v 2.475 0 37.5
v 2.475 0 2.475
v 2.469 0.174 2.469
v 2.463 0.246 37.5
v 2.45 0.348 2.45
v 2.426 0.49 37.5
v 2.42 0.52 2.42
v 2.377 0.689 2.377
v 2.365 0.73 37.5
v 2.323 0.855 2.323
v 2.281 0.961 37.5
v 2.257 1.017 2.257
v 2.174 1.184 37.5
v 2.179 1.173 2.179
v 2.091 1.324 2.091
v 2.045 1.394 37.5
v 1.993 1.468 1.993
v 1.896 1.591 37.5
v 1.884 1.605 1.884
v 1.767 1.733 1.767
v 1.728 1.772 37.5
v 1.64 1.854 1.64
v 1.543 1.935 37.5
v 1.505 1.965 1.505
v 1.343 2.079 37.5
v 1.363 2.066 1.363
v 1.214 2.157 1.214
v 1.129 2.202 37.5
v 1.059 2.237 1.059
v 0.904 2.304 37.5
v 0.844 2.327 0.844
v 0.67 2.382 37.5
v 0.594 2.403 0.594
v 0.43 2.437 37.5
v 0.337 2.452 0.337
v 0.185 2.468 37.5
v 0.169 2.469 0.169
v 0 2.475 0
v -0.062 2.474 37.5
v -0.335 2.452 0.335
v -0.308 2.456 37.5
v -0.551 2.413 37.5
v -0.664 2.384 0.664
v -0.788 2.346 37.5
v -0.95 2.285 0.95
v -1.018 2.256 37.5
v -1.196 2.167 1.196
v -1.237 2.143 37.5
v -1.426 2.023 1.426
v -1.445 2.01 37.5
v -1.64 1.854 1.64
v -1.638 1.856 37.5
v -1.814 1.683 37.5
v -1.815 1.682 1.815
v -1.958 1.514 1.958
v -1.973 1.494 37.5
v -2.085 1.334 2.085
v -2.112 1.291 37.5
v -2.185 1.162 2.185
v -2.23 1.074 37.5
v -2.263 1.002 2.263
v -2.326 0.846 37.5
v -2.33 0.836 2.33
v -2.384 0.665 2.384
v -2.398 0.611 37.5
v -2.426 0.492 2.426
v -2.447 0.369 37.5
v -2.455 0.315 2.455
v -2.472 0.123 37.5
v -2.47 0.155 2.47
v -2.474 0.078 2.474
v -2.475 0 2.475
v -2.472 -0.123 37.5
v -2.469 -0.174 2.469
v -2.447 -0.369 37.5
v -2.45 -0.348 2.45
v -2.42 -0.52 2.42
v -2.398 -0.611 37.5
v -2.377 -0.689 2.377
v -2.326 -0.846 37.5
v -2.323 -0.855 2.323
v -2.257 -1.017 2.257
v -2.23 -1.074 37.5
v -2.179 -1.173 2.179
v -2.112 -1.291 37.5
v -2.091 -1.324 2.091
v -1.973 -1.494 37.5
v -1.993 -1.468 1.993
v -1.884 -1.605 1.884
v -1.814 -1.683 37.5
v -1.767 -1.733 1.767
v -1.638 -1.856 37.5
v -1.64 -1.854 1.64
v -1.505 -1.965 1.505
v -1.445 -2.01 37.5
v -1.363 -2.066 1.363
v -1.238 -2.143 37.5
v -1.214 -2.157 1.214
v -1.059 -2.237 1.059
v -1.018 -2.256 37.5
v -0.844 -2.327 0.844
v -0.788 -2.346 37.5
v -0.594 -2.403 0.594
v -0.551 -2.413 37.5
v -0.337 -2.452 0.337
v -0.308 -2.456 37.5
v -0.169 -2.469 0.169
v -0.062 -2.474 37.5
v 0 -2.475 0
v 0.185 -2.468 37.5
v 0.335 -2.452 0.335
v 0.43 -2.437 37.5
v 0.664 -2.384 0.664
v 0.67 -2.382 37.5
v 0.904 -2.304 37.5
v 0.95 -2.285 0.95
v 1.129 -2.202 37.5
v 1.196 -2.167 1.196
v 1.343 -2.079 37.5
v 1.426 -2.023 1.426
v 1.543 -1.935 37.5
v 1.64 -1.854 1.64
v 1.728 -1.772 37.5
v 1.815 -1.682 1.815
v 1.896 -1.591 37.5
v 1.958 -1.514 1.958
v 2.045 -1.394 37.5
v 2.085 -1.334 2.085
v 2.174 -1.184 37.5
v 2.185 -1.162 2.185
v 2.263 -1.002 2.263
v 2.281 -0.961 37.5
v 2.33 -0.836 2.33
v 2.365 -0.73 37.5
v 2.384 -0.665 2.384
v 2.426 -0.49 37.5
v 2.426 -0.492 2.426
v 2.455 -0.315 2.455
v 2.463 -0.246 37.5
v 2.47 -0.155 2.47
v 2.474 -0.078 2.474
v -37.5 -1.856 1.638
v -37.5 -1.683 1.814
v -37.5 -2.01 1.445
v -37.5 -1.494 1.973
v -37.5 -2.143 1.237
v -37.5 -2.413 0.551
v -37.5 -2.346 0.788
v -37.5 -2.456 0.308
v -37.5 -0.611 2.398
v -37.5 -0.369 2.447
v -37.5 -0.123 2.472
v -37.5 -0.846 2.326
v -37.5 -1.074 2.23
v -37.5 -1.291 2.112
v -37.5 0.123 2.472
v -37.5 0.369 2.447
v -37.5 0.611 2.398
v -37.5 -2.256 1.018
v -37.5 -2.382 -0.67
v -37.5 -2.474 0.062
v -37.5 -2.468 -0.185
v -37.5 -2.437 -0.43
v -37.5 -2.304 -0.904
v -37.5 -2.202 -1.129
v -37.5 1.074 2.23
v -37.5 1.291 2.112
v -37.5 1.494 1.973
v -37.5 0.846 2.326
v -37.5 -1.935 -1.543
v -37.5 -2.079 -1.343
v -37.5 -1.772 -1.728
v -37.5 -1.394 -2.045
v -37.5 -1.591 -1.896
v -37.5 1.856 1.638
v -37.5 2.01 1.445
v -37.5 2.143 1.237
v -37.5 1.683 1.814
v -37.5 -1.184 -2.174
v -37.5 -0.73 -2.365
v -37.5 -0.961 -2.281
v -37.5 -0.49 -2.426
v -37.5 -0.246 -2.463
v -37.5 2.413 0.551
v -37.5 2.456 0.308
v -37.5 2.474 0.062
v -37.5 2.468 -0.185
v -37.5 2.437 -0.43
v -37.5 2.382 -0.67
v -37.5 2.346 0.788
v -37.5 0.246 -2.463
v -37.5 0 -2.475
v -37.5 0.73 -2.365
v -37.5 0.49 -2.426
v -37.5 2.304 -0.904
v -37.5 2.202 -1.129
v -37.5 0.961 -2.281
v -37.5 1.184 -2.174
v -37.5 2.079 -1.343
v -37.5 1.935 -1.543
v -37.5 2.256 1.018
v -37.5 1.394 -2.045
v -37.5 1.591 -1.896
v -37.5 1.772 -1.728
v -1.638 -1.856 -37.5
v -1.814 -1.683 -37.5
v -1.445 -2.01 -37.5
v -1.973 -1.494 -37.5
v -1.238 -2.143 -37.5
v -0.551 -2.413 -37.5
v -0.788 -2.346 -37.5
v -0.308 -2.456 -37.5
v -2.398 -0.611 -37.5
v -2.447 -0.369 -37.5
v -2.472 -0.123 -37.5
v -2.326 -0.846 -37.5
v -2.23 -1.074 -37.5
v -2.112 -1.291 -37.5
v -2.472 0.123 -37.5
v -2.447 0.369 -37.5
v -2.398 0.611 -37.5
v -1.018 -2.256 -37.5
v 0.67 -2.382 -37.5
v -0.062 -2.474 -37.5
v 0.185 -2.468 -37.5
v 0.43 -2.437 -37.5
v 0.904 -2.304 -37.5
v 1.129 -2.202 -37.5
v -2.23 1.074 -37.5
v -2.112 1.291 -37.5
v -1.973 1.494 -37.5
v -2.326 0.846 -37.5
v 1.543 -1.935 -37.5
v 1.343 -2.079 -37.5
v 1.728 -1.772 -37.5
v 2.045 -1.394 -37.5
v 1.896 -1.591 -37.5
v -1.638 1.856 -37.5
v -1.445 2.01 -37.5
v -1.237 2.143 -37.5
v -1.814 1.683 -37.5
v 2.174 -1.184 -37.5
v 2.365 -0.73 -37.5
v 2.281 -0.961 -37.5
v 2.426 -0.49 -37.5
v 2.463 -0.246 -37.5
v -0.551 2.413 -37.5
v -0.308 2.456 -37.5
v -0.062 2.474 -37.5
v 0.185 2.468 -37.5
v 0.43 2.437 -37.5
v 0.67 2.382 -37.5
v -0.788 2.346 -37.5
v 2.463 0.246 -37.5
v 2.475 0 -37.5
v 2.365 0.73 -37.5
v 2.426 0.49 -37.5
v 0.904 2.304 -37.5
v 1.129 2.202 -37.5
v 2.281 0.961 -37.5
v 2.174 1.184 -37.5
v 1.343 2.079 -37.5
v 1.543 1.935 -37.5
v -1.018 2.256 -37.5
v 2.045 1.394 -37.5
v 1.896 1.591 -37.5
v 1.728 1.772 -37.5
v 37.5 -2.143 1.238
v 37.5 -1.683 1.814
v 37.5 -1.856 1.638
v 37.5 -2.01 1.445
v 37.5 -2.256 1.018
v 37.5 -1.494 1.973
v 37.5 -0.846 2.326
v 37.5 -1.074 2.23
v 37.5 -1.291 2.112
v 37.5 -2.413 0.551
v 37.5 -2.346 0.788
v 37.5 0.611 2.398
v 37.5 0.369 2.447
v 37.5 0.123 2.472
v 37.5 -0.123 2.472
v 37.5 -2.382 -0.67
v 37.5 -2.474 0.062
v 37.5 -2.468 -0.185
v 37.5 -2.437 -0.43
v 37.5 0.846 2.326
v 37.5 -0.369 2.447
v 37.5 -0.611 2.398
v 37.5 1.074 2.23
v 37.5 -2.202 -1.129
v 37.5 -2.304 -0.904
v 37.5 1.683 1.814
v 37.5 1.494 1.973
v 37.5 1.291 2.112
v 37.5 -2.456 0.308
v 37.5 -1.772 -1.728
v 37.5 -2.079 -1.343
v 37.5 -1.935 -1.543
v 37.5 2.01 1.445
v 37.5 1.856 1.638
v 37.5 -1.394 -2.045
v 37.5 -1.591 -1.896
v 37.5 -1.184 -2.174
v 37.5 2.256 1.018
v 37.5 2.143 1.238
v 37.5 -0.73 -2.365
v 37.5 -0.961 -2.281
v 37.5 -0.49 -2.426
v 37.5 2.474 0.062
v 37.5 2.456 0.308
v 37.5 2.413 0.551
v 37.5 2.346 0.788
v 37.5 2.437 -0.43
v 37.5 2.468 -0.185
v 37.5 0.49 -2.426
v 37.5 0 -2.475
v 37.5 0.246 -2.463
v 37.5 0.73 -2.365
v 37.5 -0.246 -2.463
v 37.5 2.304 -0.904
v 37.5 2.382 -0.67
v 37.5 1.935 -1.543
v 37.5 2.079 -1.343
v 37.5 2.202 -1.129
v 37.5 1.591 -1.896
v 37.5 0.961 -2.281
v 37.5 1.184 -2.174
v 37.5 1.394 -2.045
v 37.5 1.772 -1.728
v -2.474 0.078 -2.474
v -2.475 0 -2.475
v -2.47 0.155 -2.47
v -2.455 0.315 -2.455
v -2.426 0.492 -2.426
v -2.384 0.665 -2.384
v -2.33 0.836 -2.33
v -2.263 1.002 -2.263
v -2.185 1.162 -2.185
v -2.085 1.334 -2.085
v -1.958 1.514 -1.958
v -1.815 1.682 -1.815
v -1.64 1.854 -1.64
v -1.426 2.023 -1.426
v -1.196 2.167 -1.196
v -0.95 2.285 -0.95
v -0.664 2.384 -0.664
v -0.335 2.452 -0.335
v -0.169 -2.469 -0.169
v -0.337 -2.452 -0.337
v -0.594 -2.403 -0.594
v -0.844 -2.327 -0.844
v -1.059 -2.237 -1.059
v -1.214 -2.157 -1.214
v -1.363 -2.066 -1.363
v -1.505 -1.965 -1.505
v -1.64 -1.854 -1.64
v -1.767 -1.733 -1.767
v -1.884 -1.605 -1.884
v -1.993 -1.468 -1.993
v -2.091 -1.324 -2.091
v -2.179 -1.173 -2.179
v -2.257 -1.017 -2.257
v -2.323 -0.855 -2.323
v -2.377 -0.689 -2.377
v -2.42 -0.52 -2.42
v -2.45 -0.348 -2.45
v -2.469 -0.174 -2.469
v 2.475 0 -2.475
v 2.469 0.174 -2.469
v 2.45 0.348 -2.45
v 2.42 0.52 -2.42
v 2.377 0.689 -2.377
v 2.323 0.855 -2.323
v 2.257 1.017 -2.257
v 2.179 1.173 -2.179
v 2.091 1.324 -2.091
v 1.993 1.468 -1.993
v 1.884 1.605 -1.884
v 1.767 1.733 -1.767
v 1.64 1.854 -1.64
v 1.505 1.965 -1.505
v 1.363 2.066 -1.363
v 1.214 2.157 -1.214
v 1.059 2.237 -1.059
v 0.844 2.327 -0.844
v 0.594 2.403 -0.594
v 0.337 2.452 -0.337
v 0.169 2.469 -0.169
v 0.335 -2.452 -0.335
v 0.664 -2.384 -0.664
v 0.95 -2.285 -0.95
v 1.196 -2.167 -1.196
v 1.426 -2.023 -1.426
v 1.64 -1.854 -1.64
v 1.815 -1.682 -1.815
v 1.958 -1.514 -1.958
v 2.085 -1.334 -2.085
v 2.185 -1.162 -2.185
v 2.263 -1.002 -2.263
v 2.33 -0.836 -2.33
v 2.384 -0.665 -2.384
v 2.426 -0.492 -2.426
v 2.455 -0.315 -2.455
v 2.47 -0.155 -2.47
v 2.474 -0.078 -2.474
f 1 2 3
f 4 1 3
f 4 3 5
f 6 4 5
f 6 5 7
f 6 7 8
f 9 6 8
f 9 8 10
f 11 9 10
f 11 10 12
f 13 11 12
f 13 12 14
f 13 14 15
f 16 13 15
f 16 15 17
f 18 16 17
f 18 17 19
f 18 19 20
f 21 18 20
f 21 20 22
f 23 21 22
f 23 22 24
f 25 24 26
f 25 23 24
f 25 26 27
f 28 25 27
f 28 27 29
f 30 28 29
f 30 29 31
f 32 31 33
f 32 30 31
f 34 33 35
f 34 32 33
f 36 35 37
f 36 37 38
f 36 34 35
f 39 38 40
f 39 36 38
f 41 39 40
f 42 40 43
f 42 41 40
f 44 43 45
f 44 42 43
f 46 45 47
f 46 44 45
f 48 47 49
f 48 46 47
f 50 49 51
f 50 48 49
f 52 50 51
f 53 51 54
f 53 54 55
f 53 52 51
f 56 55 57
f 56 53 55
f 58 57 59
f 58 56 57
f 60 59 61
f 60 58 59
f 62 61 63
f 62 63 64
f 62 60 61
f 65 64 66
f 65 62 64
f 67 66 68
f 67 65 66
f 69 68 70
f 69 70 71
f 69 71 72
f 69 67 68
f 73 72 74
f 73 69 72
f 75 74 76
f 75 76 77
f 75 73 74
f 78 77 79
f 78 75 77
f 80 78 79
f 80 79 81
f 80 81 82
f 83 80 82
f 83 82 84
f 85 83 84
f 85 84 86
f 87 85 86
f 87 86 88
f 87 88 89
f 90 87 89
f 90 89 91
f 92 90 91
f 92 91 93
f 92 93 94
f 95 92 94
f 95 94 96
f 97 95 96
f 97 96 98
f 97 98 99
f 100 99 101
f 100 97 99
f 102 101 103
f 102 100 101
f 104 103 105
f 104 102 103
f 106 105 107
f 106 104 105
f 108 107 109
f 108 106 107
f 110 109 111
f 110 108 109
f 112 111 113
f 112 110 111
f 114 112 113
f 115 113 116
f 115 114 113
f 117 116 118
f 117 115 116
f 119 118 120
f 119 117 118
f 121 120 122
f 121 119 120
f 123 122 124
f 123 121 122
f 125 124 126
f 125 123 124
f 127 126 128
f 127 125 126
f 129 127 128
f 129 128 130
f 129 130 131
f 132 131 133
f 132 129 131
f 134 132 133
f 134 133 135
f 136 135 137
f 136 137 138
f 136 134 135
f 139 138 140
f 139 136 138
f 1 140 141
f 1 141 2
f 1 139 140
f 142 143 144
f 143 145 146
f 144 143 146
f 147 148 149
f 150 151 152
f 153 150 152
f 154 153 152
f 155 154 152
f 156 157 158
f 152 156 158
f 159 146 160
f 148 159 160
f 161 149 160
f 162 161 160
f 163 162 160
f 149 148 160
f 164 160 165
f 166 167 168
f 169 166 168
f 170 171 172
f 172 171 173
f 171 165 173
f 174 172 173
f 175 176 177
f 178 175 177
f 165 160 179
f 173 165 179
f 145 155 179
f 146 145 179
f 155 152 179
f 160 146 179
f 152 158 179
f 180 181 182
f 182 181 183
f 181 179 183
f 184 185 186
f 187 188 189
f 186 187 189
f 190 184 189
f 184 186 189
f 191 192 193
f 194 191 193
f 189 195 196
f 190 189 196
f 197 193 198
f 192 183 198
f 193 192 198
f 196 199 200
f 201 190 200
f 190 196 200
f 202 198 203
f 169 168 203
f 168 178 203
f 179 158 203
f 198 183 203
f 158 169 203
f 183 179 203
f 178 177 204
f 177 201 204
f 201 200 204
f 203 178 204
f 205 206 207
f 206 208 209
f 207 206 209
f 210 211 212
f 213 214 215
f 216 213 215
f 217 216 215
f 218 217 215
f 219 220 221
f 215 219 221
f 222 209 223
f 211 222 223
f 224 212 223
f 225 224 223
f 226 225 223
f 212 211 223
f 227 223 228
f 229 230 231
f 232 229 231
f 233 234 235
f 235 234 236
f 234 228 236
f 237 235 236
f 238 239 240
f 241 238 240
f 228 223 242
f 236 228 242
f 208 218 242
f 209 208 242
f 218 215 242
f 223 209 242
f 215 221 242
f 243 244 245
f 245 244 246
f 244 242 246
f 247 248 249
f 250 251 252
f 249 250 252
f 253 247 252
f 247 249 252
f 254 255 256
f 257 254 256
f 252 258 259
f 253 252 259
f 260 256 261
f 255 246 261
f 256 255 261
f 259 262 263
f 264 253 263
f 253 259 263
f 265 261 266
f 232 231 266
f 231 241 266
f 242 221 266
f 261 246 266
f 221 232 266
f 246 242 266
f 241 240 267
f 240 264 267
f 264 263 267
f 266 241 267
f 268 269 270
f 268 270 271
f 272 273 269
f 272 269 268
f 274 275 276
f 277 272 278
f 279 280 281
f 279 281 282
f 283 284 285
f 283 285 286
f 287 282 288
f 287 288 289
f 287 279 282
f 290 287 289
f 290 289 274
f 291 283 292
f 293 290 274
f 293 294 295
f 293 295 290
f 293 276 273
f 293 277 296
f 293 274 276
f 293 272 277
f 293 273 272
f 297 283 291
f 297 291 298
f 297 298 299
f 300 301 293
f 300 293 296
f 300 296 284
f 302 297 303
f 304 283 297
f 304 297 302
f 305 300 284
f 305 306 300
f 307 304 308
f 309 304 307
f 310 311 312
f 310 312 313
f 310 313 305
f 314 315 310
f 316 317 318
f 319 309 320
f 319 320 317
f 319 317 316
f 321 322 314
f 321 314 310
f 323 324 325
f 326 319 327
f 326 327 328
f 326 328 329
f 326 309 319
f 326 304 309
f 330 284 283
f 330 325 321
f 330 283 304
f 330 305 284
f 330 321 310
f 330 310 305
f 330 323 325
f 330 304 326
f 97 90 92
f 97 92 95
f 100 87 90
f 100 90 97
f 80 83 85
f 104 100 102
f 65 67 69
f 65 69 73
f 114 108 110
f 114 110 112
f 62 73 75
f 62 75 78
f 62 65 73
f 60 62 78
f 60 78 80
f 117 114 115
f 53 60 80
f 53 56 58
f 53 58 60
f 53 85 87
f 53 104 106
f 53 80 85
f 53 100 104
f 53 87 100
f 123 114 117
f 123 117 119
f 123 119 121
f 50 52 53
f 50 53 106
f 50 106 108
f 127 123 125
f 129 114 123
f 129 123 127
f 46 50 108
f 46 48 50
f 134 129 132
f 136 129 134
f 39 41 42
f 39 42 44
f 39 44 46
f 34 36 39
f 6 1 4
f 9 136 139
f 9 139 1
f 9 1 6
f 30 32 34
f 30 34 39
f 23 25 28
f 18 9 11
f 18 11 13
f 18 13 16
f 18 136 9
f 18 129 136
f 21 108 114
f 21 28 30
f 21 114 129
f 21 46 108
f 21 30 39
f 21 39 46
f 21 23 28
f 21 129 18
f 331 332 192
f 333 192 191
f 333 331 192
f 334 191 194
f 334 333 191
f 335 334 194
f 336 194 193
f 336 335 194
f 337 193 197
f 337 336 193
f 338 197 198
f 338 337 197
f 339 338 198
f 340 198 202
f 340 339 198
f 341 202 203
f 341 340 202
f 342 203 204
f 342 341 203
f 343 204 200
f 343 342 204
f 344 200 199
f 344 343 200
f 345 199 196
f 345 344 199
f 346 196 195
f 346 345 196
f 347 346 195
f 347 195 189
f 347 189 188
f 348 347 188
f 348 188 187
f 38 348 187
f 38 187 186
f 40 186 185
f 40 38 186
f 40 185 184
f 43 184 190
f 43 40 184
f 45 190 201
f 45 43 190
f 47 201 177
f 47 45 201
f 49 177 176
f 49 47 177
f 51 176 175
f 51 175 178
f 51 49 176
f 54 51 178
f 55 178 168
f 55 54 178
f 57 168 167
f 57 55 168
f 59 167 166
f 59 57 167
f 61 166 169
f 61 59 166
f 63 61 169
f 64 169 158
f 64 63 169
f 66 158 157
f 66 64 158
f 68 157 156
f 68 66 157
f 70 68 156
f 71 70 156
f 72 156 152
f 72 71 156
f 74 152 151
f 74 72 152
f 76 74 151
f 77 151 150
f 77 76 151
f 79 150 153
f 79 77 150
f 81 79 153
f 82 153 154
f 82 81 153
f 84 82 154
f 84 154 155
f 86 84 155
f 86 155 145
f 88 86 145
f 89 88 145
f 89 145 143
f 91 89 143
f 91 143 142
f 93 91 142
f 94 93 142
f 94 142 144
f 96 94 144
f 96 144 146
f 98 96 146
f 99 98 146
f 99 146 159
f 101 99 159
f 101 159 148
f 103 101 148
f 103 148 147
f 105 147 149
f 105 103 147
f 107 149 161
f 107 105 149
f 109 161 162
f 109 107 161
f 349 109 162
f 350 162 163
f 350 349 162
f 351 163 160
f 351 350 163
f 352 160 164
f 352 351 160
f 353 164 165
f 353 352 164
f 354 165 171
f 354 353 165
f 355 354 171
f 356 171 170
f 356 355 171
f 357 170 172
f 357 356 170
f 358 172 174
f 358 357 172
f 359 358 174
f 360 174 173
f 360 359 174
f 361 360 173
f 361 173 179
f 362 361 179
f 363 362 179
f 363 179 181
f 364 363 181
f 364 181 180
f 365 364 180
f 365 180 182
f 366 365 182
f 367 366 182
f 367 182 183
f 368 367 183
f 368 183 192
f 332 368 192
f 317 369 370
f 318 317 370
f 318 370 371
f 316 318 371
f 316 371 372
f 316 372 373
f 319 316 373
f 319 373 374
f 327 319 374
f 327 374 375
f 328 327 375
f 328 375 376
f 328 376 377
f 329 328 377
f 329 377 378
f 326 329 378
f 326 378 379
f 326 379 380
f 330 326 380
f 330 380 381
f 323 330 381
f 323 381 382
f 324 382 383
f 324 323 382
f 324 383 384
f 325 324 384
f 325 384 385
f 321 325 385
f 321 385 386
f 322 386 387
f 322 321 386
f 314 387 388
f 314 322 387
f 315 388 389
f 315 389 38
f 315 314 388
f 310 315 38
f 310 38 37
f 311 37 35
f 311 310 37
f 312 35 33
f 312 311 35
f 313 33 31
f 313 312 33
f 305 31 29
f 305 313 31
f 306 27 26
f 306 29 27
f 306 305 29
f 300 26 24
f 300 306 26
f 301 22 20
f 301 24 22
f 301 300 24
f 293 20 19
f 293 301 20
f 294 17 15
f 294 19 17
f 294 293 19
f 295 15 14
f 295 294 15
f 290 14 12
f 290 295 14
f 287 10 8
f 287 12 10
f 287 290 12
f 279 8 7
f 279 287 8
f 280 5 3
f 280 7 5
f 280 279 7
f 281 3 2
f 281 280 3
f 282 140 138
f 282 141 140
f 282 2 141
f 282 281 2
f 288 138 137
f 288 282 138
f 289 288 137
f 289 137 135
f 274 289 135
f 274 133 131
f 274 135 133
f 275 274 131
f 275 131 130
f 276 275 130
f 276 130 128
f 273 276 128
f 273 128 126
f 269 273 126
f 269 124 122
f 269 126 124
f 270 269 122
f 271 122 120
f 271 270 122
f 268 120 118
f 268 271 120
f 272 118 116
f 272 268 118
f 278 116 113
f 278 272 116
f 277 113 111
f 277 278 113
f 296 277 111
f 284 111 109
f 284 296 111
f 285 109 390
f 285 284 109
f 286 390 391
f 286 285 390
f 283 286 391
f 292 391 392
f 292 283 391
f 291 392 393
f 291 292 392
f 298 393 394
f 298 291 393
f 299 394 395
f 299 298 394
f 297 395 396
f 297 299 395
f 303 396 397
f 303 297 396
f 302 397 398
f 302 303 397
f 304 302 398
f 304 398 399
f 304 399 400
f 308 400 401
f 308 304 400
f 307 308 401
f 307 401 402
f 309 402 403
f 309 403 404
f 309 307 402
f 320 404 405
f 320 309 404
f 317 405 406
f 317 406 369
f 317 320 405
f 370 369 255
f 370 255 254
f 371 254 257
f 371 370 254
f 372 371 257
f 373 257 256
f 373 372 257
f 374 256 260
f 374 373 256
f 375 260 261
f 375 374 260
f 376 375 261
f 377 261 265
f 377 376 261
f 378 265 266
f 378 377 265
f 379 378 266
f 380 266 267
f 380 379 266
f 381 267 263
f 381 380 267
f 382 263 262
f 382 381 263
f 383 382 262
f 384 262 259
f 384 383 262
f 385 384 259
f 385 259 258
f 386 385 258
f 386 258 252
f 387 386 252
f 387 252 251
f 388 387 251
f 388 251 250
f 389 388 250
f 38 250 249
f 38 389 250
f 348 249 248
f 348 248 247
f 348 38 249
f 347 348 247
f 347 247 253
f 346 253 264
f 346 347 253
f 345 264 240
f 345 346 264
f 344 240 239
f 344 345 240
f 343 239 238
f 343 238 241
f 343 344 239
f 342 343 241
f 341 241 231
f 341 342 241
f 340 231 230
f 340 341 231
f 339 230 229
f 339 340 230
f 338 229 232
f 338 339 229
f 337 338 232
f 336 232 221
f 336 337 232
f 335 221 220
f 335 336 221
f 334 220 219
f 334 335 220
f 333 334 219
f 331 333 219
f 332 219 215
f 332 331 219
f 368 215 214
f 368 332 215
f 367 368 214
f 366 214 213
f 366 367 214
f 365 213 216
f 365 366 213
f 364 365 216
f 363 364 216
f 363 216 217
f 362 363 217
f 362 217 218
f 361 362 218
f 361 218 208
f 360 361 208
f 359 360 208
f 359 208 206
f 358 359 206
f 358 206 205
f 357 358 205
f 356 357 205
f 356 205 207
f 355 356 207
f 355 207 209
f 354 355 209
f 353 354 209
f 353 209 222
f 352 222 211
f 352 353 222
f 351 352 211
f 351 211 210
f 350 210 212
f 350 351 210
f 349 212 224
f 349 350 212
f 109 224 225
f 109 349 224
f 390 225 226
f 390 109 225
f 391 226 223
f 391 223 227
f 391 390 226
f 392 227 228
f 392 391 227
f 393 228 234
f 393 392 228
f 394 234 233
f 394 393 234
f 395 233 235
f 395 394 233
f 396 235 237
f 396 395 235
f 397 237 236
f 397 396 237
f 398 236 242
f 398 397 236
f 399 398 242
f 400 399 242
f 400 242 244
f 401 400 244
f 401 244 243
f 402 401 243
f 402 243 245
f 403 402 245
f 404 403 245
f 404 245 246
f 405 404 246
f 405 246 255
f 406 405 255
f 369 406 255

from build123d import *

# Parameters (mm, degrees)
SKETCH2_R           = 2.475
BOSS_EXTRUDE1_DEPTH = 37.5
CIRPATTERN1_COUNT   = 2
CIRPATTERN1_ANGLE   = 90


with BuildPart() as part:
    # Sketch2 → Boss-Extrude1 (new, symmetric)
    with BuildSketch(Plane.XY):
        Circle(SKETCH2_R)
    boss_extrude1 = extrude(amount=BOSS_EXTRUDE1_DEPTH, both=True)

    # CirPattern1: Boss-Extrude1 ×2 about axis
    cirpattern1_axis = Axis((0, -2.7225, 0), (0, 1, 0))
    for i in range(1, CIRPATTERN1_COUNT):
        add(boss_extrude1.rotate(cirpattern1_axis, i * CIRPATTERN1_ANGLE / (CIRPATTERN1_COUNT - 1)))


solid = part.part
